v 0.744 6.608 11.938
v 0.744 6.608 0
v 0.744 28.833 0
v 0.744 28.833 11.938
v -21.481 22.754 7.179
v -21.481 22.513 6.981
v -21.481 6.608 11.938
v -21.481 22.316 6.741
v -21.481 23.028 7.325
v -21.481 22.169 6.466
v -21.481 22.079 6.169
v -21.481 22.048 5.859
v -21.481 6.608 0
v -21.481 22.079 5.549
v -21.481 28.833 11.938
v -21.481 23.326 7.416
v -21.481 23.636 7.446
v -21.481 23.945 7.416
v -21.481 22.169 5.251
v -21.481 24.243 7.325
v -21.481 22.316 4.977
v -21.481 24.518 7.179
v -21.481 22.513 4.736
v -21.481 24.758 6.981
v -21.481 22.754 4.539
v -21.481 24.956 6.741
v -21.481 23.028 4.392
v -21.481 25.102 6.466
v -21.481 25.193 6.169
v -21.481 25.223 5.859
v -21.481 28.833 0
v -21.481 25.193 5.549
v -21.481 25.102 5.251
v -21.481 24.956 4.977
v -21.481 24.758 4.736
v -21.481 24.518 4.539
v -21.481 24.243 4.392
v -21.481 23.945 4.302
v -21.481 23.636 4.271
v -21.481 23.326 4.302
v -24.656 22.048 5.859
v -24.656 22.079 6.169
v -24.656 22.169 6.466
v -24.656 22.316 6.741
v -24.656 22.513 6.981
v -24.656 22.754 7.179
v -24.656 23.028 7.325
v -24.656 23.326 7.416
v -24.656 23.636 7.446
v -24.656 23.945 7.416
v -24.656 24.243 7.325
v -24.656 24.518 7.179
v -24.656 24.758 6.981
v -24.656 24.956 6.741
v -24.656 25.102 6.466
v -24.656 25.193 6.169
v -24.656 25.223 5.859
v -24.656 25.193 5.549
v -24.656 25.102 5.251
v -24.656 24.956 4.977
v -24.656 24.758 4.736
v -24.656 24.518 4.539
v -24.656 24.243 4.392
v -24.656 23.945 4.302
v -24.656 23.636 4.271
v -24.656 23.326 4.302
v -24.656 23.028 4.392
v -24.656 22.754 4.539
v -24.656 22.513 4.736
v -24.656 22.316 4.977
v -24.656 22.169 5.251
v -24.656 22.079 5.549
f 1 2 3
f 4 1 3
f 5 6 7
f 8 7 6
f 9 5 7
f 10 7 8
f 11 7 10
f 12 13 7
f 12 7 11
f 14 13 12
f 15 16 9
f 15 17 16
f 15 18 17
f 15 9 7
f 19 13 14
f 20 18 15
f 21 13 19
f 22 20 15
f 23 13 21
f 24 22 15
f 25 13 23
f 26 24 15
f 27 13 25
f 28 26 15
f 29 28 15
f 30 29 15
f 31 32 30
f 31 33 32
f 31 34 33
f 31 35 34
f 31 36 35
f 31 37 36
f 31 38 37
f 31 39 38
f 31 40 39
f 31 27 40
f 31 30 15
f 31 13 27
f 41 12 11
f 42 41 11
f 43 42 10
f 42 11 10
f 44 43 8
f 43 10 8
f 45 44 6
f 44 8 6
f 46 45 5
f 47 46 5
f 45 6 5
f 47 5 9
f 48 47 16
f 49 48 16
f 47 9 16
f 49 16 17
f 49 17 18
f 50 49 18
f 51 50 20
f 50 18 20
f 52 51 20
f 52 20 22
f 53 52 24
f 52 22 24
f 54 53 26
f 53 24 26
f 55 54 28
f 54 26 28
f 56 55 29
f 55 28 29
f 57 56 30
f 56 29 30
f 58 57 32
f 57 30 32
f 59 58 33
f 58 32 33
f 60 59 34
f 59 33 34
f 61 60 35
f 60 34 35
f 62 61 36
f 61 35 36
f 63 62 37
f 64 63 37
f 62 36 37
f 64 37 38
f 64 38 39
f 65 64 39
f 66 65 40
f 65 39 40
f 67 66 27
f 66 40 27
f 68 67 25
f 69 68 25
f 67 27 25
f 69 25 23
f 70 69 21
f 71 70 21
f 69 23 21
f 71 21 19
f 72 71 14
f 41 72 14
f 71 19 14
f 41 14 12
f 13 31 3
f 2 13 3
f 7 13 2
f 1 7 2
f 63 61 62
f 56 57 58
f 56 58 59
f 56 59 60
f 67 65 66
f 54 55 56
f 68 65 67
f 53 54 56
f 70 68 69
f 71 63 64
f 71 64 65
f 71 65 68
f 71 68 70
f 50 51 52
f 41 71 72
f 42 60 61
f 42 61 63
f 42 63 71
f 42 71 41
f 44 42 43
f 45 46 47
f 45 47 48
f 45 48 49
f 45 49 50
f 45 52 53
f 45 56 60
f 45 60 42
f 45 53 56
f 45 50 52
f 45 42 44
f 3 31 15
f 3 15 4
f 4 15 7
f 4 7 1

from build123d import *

# Parameters (mm, degrees)
F0_W     = 22.225
F0_H     = 22.225
F1_DEPTH = 11.938
F2_R     = 1.5875
F3_DEPTH = 3.175


with BuildPart() as f1:
    # F0 (on Top) → F1 (new body)
    with BuildSketch(Plane.XY):
        with Locations((-10.368031, 17.720491)):
            Rectangle(F0_W, F0_H)
    extrude(amount=F1_DEPTH)

    # F2 (on face) → F3 (join)
    with BuildSketch(Plane(origin=(-21.480531, 0, 0), x_dir=(0, -1, 0), z_dir=(-1, 0, 0))):
        with Locations((-23.635626, 5.858807)):
            Circle(F2_R)
    extrude(amount=F3_DEPTH)


solid = f1.part
